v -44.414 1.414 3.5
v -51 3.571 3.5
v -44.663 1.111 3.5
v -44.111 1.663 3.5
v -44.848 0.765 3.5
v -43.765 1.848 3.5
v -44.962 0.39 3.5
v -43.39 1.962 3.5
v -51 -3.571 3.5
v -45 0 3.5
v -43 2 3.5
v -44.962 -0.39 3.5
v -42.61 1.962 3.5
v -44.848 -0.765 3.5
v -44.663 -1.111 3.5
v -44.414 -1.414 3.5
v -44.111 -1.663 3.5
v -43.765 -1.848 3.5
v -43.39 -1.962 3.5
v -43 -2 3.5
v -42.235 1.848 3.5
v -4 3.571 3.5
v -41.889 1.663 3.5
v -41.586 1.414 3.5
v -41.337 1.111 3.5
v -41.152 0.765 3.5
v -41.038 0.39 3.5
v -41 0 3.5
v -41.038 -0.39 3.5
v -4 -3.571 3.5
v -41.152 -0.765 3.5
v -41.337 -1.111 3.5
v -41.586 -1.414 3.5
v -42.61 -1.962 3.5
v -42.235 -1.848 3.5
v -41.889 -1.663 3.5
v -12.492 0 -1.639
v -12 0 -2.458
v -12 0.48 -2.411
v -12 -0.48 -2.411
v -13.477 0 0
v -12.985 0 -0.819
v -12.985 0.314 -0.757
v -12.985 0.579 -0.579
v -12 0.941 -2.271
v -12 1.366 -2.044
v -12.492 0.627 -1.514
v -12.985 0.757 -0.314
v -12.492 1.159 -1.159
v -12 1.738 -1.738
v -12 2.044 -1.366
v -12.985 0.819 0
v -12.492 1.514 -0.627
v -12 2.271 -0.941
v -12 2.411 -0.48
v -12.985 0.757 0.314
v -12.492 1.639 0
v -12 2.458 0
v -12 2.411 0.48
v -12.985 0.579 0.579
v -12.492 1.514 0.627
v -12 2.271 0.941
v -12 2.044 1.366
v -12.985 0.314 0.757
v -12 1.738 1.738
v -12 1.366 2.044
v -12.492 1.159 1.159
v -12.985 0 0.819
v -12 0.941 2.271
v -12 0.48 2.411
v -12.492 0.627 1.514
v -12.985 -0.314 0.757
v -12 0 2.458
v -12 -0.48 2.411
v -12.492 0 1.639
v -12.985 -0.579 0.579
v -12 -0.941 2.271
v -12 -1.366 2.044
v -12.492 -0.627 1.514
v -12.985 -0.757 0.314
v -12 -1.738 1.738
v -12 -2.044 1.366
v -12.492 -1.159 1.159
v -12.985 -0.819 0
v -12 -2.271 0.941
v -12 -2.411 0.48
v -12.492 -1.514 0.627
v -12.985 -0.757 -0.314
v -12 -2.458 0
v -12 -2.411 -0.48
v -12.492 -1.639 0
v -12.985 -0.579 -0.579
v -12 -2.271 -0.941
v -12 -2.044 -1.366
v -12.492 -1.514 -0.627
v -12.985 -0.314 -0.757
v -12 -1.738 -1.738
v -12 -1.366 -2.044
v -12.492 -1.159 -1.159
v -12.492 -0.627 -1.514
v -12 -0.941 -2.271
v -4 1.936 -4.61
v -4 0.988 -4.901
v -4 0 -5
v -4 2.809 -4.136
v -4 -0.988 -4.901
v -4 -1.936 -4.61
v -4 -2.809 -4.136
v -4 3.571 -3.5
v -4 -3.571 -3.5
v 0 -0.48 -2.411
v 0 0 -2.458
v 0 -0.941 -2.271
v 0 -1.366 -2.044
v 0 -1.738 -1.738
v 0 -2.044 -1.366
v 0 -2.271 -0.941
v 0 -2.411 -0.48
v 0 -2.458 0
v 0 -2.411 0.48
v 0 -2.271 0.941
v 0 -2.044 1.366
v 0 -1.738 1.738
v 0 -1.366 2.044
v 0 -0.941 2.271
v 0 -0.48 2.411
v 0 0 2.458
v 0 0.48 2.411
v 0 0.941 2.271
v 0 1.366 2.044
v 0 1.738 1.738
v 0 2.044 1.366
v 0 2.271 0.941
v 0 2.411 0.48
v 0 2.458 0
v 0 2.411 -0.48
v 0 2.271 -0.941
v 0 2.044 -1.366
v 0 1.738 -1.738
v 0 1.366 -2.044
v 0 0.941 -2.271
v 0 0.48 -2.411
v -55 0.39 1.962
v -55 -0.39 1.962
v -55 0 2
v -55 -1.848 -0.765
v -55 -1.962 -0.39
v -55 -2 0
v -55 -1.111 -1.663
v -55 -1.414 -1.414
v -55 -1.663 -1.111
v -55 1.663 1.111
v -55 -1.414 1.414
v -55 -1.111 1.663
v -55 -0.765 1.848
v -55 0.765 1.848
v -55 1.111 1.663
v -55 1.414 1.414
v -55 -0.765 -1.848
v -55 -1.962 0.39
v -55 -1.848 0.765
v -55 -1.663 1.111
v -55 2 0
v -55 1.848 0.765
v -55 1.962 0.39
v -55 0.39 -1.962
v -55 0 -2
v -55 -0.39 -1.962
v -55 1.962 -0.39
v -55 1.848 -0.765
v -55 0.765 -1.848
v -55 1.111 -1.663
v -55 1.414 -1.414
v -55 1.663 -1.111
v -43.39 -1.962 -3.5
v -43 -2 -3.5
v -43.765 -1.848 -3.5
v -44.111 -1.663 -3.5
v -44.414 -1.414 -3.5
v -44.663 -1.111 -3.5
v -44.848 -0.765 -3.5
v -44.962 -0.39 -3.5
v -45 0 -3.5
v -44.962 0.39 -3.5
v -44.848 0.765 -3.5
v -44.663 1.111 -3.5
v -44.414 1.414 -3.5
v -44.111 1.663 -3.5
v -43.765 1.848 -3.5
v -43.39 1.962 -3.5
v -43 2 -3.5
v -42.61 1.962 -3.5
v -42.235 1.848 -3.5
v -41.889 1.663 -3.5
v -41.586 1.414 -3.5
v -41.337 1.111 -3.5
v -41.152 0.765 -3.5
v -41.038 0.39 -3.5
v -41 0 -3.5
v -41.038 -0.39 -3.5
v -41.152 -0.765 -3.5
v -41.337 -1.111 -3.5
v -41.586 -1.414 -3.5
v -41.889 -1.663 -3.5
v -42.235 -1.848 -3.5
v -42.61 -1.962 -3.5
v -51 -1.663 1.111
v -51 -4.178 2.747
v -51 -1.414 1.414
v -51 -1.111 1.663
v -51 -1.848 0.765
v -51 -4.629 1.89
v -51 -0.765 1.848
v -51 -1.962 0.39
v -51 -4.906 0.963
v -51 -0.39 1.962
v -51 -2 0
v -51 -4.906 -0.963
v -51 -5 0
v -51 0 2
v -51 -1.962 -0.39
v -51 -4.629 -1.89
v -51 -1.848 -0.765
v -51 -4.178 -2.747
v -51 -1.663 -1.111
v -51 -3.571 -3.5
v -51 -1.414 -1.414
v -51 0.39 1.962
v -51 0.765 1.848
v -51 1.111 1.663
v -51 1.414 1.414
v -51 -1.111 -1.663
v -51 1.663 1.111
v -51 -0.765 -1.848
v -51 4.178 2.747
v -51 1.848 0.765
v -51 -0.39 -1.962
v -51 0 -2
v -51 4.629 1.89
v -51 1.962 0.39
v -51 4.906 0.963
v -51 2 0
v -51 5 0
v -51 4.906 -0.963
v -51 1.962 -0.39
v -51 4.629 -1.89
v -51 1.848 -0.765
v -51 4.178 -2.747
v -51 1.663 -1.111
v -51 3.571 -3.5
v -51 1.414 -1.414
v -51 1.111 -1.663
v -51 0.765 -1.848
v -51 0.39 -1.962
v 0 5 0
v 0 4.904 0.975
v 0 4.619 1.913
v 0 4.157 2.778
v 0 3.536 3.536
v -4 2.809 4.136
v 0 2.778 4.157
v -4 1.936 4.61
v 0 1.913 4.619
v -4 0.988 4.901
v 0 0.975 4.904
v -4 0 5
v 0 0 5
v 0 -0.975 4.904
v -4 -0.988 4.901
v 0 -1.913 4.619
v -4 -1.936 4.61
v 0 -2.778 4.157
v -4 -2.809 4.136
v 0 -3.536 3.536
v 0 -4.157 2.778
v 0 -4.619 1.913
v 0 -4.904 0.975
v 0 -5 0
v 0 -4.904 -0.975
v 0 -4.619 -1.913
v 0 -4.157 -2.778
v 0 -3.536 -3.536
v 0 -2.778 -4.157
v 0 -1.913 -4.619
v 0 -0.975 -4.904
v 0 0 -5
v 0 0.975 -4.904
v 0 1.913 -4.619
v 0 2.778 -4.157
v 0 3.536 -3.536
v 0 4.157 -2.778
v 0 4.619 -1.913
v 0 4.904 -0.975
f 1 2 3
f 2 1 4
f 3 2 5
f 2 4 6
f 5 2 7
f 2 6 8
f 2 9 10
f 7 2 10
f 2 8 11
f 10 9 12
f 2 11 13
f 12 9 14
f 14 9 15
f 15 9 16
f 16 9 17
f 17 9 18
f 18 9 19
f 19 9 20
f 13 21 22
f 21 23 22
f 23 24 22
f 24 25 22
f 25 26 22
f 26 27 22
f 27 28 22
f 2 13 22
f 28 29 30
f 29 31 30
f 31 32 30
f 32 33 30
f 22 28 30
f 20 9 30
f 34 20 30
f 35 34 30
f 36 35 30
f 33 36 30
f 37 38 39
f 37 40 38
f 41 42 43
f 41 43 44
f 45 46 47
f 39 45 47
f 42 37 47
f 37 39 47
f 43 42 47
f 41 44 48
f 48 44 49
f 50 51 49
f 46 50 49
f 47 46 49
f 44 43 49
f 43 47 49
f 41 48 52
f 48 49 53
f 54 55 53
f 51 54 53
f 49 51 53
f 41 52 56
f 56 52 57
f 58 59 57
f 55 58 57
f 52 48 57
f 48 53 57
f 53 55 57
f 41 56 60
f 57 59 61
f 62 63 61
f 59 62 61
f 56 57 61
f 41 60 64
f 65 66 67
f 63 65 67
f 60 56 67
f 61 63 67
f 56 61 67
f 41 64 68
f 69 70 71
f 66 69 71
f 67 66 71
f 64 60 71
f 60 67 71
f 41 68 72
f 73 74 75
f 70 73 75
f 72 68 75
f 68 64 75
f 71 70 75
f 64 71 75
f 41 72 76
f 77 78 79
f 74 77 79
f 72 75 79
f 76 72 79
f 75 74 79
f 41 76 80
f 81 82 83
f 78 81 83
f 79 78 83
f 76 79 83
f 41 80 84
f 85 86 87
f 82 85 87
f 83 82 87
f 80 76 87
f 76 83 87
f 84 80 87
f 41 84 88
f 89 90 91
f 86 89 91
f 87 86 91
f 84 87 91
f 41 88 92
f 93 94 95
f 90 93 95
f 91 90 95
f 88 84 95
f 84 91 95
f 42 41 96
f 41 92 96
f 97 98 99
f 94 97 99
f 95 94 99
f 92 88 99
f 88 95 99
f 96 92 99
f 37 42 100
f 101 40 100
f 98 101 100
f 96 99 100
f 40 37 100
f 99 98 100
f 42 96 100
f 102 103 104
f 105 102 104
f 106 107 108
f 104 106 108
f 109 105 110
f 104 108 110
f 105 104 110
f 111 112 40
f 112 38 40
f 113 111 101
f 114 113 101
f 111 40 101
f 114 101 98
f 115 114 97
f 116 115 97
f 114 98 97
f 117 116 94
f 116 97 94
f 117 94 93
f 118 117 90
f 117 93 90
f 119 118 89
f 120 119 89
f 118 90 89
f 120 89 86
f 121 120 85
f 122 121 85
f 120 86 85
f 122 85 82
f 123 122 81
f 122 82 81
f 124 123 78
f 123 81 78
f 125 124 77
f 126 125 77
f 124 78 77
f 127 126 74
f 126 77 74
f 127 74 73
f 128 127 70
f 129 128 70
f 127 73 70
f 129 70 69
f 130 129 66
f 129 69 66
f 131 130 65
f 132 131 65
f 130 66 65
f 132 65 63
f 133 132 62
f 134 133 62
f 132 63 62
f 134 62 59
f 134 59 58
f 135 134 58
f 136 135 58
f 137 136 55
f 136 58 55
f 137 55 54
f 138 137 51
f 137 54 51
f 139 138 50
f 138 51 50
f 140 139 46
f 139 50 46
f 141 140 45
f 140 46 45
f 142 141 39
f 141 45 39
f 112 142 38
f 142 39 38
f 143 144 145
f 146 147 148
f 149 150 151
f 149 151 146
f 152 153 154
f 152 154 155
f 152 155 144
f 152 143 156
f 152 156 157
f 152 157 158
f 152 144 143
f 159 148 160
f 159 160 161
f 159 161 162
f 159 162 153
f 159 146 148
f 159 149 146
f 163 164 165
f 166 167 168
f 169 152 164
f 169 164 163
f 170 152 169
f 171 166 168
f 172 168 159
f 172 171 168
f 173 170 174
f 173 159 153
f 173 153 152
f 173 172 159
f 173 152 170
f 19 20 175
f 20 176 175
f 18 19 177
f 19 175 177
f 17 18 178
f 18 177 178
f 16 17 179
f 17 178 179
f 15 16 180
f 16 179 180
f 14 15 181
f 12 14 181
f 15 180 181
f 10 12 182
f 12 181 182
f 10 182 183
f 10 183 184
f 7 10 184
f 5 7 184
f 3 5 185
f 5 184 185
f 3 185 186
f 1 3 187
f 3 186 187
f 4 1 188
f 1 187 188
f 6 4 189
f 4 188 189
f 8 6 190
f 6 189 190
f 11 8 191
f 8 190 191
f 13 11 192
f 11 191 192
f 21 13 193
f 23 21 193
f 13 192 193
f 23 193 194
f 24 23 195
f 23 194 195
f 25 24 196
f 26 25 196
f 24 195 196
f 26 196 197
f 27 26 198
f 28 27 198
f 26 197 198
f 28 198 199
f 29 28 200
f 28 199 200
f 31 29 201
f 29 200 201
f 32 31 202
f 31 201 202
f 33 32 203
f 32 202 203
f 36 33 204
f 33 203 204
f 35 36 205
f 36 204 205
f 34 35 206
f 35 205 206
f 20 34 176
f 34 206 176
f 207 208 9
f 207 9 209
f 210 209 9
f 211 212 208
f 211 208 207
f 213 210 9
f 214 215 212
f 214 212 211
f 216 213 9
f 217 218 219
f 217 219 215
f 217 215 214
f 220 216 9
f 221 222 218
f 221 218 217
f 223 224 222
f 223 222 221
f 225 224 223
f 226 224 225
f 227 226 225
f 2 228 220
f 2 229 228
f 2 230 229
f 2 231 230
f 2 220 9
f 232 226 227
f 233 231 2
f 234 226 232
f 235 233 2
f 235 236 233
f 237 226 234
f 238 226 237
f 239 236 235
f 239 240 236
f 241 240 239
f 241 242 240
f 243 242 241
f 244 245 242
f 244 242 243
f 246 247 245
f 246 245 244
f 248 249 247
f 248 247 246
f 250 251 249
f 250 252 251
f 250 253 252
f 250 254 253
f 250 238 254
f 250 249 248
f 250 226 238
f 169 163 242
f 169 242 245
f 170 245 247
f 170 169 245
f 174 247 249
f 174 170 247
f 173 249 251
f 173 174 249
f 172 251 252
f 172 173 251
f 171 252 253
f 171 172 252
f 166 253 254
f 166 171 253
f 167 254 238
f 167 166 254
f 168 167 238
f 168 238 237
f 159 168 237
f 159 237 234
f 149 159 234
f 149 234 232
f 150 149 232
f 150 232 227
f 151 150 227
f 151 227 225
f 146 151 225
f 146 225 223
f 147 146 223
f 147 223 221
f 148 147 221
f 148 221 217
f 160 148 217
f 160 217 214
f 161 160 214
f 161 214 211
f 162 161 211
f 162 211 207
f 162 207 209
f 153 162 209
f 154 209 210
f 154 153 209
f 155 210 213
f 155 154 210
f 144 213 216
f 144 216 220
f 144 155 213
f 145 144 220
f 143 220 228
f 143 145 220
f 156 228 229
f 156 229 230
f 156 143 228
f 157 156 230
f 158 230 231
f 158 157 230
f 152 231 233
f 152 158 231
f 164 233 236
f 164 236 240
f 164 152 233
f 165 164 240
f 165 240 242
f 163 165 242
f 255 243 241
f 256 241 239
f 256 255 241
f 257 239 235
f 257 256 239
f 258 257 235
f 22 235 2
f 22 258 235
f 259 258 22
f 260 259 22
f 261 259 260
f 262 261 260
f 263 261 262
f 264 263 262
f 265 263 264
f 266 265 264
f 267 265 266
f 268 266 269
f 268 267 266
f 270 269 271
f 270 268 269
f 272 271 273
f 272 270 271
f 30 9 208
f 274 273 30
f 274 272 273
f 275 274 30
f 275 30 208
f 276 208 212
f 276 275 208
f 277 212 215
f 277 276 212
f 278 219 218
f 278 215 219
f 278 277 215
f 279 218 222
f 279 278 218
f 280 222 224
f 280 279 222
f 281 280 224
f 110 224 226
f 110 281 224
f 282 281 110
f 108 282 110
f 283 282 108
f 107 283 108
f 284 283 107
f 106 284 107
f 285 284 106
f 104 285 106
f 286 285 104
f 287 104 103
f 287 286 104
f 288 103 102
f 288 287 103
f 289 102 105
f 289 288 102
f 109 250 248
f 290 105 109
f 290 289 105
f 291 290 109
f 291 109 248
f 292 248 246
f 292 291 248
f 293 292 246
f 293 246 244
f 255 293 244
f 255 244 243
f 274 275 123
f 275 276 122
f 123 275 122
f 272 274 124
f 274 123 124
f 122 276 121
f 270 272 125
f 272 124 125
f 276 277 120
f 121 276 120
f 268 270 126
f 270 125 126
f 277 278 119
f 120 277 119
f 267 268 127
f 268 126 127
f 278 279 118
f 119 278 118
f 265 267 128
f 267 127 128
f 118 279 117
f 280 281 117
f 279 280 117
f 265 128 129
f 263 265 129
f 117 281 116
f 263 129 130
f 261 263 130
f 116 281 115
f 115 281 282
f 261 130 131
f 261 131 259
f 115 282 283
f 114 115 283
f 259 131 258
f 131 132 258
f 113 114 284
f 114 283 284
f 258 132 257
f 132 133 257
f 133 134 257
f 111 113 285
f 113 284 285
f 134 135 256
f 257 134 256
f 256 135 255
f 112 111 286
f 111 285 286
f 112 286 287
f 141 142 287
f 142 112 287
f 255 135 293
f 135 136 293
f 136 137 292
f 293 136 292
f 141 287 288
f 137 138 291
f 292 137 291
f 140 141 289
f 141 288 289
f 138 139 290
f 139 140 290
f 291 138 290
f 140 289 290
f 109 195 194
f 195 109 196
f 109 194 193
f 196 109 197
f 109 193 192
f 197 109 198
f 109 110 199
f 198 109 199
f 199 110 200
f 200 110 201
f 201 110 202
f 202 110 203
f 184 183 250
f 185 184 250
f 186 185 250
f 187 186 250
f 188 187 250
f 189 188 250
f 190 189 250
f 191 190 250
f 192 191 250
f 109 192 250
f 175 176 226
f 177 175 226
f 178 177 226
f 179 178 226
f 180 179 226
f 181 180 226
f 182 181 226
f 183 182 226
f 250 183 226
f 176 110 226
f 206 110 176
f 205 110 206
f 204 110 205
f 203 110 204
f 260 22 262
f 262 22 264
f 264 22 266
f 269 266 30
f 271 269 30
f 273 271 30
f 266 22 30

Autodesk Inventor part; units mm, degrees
ref_plane "YZ Plane" through (0, 0, 0) normal (1, 0, 0) x (0, 1, 0)
ref_plane "XZ Plane" through (0, 0, 0) normal (0, 1, 0) x (-1, 0, 0)
ref_plane "XY Plane" through (0, 0, 0) normal (0, 0, 1) x (1, 0, 0)
sketch "Skizze1" plane through (0, 0, 0) normal (0, 0, 1) x (1, 0, 0)
  line L0 (0, 0) -> (-67, 0)
  line L1 (-51, 5) -> (0, 5)
  line L2 (0, 5) -> (0, 0)
  line L3 (-51, 5) -> (-51, 2)
  line L4 (-51, 2) -> (-55, 2)
  line L5 (-55, 2) -> (-55, 0)
  line L6 (-56, 0) -> (-55, 0)
  dimension "d0" = 51
  dimension "d42" = 10
  dimension "d60" = 4
  dimension "d61" = 4
revolve "Umdrehung1" add sketch "Skizze1" angle 360 about axis through (0, 0, 0) along (-1, 0, 0)
sketch "Skizze3" plane through (0, 0, 0) normal (0, 1, 0) x (-1, 0, 0)
  line L0 (51, 5) -> (51, -5) construction
  line L1 (51, -5) -> (0, -5) construction
  line L2 (51, 5) -> (0, 5) construction
  line L3 (51, -5) -> (4, -5)
  line L4 (4, -5) -> (4, -3.5)
  line L5 (4, -3.5) -> (51, -3.5)
  line L6 (51, -3.5) -> (51, -5)
  line L7 (4, 5) -> (51, 5)
  line L8 (51, 5) -> (51, 3.5)
  line L9 (51, 3.5) -> (4, 3.5)
  line L10 (4, 3.5) -> (4, 5)
  line L11 (0, 5) -> (0, -5) projected
  point P0 (0, 0)
  dimension "d10" = 7
  dimension "d11" = 4
extrude "Extrusion1" cut sketch "Skizze3" along normal through all both and the other way through all
sketch "Skizze8" plane through (-4, -3.5707, 3.5) normal (0, 0, 1) x (1, 0, 0)
  line L0 (0, 0) -> (-47, 0) construction
  line L1 (0, 7.1414) -> (0, 0) construction
  line L2 (-47, 7.1414) -> (0, 7.1414) construction
  line L3 (-47, 0) -> (-47, 7.1414) construction
  line L4 (4, -1.4293) -> (4, 8.5707) construction
  point P0 (-39, 3.5707)
  point P1 (4, 3.5707)
  dimension "d63" = 8
hole "Bohrung3" at (-43, 0, 3.5) direction (0, 0, -1) diameter 4 end through all
sketch "Skizze9" plane through (0, 0, 0) normal (1, 0, 0) x (0, 0, -1)
  circle A0 centre (0, 0) radius 5 construction
hole "Bohrung5" at (0, 0, 0) direction (-1, 0, 0) diameter 4.917 depth 12 tip angle 118 thread size "M6x1" class "6H" standard "ISO Metric profile"
properties part number "Shaft_newtest" material "Aluminium 6061"
